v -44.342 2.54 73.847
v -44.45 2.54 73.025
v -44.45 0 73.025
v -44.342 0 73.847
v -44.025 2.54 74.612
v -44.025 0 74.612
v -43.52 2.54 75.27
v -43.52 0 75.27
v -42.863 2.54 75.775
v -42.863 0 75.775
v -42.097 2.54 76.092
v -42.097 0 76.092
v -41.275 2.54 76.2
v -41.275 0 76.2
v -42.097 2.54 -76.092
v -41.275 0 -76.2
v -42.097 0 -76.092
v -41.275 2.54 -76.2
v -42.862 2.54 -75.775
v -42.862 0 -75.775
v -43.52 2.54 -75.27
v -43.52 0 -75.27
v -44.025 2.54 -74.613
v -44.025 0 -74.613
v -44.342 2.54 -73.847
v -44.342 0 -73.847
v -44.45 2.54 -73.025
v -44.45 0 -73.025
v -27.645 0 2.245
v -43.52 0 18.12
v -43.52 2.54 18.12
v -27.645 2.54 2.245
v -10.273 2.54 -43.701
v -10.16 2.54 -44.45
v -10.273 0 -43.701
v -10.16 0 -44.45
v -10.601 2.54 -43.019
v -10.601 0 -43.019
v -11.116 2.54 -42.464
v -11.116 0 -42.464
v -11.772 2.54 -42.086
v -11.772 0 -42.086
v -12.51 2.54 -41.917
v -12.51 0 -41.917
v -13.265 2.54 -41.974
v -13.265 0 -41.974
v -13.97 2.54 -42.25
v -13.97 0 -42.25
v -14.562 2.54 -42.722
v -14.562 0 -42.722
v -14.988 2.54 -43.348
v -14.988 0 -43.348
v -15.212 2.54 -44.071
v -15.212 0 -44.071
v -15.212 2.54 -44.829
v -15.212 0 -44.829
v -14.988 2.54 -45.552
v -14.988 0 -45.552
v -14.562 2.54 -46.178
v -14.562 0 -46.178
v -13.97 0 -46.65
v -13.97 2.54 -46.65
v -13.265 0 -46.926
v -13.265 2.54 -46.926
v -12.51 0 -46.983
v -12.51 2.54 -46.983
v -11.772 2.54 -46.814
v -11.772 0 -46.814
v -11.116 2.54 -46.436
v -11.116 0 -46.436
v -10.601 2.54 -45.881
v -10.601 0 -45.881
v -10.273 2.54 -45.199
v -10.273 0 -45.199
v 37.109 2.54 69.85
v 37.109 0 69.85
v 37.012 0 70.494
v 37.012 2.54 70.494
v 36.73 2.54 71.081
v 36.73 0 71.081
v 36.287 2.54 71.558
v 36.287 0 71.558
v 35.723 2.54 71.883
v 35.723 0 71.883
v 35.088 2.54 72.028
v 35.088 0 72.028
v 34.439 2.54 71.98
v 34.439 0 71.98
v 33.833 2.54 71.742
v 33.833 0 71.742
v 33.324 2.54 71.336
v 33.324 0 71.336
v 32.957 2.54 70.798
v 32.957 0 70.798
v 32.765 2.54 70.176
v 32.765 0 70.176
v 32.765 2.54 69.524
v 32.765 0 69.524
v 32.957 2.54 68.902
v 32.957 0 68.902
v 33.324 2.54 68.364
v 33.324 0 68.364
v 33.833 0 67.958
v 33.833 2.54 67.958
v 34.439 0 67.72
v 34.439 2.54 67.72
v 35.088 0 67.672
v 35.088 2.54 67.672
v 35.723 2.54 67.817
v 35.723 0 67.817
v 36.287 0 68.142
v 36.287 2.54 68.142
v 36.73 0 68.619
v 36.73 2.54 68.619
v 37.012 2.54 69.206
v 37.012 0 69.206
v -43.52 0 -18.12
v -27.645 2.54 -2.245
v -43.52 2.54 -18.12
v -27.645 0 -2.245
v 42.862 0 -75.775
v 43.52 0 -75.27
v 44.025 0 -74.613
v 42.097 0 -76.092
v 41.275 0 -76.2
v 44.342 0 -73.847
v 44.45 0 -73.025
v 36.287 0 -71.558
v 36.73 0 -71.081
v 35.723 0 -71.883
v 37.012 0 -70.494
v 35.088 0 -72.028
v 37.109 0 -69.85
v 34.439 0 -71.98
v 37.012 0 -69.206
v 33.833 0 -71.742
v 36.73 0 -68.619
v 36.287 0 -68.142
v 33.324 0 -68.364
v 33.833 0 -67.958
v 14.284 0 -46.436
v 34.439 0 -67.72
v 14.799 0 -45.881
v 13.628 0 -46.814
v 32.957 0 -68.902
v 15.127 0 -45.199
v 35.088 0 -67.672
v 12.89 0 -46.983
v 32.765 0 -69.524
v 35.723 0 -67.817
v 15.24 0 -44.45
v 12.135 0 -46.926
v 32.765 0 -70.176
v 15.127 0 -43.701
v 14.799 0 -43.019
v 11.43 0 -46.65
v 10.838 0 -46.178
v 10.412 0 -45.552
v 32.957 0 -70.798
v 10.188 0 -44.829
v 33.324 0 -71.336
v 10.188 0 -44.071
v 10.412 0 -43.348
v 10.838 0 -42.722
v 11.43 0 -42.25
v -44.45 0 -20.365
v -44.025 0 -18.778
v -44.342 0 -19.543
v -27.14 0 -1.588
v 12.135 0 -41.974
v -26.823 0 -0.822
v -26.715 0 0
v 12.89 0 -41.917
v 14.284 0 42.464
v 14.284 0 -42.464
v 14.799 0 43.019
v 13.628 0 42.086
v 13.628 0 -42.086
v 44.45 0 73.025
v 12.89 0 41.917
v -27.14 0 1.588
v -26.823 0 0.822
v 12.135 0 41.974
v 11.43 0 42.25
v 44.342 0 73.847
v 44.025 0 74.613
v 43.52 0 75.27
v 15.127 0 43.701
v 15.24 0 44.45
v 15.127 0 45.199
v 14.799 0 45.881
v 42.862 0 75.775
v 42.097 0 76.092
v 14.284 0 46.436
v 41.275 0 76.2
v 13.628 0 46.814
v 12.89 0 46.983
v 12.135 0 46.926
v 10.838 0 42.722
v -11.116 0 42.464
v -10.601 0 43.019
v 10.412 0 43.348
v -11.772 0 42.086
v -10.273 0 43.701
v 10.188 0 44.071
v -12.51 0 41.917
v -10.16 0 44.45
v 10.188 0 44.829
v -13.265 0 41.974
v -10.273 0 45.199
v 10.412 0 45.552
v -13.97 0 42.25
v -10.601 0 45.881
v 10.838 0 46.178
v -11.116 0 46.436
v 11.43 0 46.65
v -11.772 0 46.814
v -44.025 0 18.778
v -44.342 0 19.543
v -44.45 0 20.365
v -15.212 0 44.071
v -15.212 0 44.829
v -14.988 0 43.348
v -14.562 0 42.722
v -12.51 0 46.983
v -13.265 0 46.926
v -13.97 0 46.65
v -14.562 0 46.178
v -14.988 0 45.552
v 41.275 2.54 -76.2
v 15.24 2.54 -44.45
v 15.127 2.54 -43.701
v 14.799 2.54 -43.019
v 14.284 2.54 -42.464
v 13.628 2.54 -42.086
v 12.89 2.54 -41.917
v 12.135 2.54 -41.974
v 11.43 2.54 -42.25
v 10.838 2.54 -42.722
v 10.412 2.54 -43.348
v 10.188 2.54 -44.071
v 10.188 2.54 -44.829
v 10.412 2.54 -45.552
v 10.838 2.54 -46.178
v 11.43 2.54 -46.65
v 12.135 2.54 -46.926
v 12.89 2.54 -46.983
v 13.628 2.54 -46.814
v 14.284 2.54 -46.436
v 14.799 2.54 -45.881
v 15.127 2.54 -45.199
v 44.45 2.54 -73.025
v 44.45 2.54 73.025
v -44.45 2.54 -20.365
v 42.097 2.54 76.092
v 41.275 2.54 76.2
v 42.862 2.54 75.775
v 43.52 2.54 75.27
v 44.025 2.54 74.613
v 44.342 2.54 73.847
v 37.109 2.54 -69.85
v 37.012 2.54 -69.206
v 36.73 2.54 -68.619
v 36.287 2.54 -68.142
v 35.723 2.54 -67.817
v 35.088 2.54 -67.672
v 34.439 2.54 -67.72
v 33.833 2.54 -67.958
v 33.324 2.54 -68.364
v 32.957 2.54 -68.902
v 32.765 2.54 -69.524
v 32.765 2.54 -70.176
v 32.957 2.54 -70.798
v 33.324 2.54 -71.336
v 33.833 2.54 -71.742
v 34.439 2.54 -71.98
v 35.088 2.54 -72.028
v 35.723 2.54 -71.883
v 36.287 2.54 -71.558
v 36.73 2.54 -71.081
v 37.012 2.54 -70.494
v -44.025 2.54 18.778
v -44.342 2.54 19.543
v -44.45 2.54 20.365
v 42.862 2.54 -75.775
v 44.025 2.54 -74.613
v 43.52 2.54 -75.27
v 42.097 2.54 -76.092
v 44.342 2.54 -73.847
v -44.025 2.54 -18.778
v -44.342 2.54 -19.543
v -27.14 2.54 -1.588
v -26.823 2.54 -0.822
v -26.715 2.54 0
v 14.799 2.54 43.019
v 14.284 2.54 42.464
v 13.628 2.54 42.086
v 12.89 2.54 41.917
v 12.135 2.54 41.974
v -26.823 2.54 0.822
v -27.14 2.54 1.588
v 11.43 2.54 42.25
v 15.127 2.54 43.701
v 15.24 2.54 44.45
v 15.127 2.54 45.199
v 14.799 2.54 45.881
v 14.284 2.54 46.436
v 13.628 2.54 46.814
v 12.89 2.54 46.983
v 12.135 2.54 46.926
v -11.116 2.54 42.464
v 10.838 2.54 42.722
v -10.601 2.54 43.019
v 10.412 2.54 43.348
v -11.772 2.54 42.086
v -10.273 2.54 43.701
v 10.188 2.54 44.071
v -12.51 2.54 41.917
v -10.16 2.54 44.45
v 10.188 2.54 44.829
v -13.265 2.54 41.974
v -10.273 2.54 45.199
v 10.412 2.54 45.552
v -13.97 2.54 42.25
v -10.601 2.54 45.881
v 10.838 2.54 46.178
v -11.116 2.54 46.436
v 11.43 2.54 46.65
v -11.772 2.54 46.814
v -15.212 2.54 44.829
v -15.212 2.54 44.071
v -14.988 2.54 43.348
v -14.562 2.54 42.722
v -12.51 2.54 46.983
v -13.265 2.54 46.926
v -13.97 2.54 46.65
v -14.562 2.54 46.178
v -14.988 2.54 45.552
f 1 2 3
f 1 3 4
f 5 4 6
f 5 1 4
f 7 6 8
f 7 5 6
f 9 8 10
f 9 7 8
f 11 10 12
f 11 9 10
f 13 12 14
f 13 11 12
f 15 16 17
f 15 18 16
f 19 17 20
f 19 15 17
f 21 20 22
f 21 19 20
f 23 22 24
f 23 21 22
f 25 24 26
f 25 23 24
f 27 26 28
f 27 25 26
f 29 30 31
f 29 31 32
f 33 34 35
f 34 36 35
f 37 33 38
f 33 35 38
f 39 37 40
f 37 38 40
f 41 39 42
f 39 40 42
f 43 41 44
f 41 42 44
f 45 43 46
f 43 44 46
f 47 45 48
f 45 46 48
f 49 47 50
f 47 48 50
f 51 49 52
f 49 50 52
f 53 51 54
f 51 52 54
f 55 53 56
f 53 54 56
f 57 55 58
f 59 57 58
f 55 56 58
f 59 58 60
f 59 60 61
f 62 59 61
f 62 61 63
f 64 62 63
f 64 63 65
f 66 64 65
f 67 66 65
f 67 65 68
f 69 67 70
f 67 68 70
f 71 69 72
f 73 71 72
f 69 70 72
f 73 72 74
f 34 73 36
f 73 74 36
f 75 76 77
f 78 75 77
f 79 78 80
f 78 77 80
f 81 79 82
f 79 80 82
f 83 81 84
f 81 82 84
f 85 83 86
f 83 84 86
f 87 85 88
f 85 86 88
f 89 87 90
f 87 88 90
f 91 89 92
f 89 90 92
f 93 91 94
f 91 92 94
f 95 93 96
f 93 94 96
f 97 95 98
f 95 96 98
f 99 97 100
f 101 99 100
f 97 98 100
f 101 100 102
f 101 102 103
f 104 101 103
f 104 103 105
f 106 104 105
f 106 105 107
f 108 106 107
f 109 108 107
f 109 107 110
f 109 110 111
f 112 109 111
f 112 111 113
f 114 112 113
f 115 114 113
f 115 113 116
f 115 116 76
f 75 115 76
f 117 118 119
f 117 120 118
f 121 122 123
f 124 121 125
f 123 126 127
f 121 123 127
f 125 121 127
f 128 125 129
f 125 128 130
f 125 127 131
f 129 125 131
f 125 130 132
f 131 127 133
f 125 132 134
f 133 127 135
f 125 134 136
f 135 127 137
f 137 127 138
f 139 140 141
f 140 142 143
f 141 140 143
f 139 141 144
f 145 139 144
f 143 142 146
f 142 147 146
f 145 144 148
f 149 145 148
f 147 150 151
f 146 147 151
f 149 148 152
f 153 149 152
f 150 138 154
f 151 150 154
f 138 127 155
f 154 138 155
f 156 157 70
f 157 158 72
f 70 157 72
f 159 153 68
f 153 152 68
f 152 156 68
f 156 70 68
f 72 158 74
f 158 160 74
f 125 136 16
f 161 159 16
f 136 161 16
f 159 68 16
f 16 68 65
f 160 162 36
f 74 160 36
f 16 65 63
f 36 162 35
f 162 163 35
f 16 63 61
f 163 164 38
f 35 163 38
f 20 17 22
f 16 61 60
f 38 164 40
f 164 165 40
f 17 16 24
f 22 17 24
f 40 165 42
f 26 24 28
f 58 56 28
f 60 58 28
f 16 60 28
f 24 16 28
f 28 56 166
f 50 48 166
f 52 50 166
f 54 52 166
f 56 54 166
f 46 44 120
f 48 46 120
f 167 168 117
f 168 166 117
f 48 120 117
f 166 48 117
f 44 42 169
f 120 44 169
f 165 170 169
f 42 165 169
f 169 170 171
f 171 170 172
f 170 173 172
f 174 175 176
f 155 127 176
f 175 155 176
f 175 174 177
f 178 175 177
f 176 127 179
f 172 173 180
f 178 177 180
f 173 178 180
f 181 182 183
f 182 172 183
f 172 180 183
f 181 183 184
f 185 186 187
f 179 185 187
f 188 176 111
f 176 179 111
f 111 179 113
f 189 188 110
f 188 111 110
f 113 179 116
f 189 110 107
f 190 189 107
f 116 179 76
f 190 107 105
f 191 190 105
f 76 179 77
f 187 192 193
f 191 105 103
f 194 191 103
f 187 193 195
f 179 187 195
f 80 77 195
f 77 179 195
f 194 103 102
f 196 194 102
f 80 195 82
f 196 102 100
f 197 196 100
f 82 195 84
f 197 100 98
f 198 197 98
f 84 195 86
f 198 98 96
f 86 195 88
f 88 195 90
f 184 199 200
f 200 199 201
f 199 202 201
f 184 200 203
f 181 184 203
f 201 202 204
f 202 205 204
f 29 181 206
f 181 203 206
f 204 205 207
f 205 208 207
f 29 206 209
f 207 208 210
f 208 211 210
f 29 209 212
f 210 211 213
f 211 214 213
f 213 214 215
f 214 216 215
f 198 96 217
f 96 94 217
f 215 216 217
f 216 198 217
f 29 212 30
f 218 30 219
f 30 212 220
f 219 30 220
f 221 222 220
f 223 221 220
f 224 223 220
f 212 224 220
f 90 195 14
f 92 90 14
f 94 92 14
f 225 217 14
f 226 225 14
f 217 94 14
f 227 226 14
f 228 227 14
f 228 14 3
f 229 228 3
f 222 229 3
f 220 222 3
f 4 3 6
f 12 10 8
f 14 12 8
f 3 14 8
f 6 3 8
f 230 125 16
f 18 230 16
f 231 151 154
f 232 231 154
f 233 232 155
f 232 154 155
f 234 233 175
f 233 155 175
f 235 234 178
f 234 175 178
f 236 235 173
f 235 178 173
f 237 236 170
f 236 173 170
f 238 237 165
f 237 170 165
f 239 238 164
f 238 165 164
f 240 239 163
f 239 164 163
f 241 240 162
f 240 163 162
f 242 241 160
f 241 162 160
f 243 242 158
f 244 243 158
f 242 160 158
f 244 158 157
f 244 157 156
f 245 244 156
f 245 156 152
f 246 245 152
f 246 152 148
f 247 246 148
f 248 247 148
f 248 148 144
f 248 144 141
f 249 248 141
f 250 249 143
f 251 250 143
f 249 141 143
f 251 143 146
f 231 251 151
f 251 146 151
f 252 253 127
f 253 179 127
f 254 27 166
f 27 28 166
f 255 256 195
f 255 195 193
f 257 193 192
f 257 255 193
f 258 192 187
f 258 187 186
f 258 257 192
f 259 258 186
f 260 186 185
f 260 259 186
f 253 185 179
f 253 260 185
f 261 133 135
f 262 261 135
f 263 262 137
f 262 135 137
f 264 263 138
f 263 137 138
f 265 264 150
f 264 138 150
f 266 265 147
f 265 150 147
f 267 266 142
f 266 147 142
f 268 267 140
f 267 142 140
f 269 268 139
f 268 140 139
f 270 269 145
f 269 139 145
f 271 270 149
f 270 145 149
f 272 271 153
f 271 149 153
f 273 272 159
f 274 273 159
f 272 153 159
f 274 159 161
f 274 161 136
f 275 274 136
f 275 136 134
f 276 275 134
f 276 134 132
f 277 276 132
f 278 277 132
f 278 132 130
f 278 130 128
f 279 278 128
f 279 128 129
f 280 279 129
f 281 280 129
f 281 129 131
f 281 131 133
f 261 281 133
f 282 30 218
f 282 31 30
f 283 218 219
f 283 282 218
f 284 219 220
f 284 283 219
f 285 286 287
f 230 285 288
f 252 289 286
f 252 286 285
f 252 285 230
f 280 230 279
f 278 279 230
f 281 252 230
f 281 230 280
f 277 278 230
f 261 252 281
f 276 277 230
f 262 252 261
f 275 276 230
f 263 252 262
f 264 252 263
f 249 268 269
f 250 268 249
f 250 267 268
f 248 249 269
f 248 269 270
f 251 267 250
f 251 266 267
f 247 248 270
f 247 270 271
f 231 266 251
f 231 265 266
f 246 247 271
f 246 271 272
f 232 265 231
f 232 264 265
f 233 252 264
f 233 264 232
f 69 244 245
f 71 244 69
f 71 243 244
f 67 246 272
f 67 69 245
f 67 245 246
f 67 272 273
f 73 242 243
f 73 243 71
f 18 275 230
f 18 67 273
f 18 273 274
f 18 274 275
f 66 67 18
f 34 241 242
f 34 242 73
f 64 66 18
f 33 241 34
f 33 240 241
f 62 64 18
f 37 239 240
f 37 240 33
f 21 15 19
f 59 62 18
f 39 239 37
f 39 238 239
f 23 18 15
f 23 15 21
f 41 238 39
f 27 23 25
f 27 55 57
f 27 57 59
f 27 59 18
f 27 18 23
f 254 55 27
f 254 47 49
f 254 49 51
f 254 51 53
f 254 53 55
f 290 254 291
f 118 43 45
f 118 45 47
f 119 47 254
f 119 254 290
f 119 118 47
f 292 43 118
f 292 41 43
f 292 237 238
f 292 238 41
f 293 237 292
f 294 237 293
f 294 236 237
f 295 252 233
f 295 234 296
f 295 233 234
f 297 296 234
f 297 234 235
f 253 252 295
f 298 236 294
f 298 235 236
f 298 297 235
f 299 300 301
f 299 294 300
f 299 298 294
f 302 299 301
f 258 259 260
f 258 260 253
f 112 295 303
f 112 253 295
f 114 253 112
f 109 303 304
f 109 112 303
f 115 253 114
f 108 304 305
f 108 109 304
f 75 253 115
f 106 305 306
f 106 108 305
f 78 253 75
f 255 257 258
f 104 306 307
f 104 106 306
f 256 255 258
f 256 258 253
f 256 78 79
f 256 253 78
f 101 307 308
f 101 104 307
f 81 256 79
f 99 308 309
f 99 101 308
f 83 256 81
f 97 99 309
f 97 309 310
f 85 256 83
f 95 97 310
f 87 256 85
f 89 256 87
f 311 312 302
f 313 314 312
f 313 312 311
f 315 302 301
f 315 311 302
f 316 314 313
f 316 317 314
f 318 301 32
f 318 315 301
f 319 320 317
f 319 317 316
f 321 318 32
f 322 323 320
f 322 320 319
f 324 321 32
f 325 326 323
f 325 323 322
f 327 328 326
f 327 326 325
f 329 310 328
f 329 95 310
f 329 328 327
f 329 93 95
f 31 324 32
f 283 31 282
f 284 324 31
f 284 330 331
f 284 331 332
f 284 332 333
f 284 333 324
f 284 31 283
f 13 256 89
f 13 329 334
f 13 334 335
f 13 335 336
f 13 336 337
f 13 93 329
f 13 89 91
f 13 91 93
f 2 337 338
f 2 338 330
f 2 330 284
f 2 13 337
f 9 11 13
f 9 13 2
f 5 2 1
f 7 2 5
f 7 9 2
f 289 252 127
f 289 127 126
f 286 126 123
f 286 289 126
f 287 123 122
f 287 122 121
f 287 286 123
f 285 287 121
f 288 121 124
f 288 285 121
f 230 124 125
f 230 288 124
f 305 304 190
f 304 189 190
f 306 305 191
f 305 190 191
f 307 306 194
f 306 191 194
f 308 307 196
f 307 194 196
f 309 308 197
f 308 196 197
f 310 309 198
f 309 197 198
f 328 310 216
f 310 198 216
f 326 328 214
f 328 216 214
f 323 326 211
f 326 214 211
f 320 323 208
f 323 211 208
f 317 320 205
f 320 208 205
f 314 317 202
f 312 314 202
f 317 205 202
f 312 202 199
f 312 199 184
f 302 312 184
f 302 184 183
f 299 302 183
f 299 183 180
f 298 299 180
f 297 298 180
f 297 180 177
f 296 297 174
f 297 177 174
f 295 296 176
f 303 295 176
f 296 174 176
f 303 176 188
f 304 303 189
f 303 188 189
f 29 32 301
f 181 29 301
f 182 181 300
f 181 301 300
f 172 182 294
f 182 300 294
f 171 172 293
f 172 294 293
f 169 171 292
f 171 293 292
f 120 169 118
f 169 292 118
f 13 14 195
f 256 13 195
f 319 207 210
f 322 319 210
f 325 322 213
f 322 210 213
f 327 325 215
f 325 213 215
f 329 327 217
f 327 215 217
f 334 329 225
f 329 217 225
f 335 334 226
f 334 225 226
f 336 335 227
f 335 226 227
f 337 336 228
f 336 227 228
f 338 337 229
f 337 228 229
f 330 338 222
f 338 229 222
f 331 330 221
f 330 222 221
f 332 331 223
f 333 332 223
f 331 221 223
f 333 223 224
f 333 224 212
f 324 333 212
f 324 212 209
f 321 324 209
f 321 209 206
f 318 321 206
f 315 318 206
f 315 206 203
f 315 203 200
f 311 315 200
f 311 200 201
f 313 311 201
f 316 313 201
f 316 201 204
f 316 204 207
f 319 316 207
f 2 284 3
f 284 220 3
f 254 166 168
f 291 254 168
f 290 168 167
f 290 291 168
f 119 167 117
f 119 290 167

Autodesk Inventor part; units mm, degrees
ref_plane "YZ Plane" through (0, 0, 0) normal (1, 0, 0) x (0, 1, 0)
ref_plane "XZ Plane" through (0, 0, 0) normal (0, 1, 0) x (-1, 0, 0)
sketch "Sketch1" plane through (0, 0, 0) normal (0, 1, 0) x (-1, 0, 0)
  line L0 (44.45, 76.2) -> (-44.45, 76.2)
  line L1 (-44.45, -76.2) -> (44.45, -76.2)
  line L2 (44.45, 76.2) -> (-44.45, -76.2) construction
  line L3 (-44.45, 76.2) -> (44.45, -76.2) construction
  line L4 (0, 0) -> (-53.721, 0) construction
  line L5 (-44.45, 76.2) -> (-44.45, -76.2)
  line L6 (-44.45, -35.3838) -> (-44.45, -76.2)
  line L7 (44.45, 19.05) -> (25.4, 0)
  line L8 (25.4, 0) -> (44.45, -19.05)
  line L9 (44.45, -76.2) -> (44.45, -19.05)
  line L10 (44.45, 19.05) -> (44.45, 76.2)
  point P0 (-12.7, 0)
  point P1 (-44.45, 0)
  dimension "d0" = 88.9
  dimension "d1" = 152.4
  dimension "d4" = 12.7
  dimension "d27" = 90
  dimension "d29" = 19.05
extrude "Extrusion1" add sketch "Sketch1" along normal blind 2.54
ref_plane "Work Plane1" through (-44.45, 0, 69.85) normal (0, 0, 1) x (1, 0, 0)
sketch "Sketch3" plane through (0, 0, 0) normal (0, -1, 0) x (1, 0, 0)
  arc A0 (41.275, 69.85) -> (34.925, 76.2) centre (34.925, 69.85) ccw projected
  circle A1 centre (34.925, 69.85) radius 2.1844
  circle A2 centre (34.925, -69.85) radius 2.1844
  arc A3 (34.925, -76.2) -> (41.275, -69.85) centre (34.925, -69.85) ccw projected
  point P0 (0, 0)
  dimension "d22" = 4.3688
  dimension "d23" = 4.3688
extrude "Extrusion3" cut sketch "Sketch3" against normal through all
fillet "Fillet2" radius 3.175 3 edges at (-25.4, 1.27, 0) (-44.45, 1.27, -19.05) (-44.45, 1.27, 19.05)
fillet "Fillet3" radius 3.175 4 edges at (-44.45, 1.27, -76.2) (44.45, 1.27, -76.2) (44.45, 1.27, 76.2) (-44.45, 1.27, 76.2)
sketch "Sketch4" plane through (0, 0, 0) normal (0, -1, 0) x (1, 0, 0)
  circle A0 centre (-12.7, 44.45) radius 2.54
  circle A1 centre (12.7, 44.45) radius 2.54
  circle A2 centre (-12.7, -44.45) radius 2.54
  circle A3 centre (12.7, -44.45) radius 2.54
  line L0 (41.275, -76.2) -> (-41.275, -76.2) projected
  line L1 (0, -76.2) -> (0, 76.2) construction
  line L2 (-41.275, 76.2) -> (41.275, 76.2) projected
  line L3 (-12.7, -44.45) -> (-12.7, 44.45) construction
  arc A4 (-27.6451, -2.2451) -> (-27.6451, 2.2451) centre (-29.8901, 0) ccw projected
  line L4 (-26.7151, 0) -> (44.45, 0) construction
  line L5 (44.45, 73.025) -> (44.45, -73.025) projected
  point P0 (0, 0)
  dimension "d33" = 25.4
  dimension "d34" = 5.08
  dimension "d35" = 88.9
extrude "Extrusion4" cut sketch "Sketch4" against normal through all
properties part number "match_loader"
